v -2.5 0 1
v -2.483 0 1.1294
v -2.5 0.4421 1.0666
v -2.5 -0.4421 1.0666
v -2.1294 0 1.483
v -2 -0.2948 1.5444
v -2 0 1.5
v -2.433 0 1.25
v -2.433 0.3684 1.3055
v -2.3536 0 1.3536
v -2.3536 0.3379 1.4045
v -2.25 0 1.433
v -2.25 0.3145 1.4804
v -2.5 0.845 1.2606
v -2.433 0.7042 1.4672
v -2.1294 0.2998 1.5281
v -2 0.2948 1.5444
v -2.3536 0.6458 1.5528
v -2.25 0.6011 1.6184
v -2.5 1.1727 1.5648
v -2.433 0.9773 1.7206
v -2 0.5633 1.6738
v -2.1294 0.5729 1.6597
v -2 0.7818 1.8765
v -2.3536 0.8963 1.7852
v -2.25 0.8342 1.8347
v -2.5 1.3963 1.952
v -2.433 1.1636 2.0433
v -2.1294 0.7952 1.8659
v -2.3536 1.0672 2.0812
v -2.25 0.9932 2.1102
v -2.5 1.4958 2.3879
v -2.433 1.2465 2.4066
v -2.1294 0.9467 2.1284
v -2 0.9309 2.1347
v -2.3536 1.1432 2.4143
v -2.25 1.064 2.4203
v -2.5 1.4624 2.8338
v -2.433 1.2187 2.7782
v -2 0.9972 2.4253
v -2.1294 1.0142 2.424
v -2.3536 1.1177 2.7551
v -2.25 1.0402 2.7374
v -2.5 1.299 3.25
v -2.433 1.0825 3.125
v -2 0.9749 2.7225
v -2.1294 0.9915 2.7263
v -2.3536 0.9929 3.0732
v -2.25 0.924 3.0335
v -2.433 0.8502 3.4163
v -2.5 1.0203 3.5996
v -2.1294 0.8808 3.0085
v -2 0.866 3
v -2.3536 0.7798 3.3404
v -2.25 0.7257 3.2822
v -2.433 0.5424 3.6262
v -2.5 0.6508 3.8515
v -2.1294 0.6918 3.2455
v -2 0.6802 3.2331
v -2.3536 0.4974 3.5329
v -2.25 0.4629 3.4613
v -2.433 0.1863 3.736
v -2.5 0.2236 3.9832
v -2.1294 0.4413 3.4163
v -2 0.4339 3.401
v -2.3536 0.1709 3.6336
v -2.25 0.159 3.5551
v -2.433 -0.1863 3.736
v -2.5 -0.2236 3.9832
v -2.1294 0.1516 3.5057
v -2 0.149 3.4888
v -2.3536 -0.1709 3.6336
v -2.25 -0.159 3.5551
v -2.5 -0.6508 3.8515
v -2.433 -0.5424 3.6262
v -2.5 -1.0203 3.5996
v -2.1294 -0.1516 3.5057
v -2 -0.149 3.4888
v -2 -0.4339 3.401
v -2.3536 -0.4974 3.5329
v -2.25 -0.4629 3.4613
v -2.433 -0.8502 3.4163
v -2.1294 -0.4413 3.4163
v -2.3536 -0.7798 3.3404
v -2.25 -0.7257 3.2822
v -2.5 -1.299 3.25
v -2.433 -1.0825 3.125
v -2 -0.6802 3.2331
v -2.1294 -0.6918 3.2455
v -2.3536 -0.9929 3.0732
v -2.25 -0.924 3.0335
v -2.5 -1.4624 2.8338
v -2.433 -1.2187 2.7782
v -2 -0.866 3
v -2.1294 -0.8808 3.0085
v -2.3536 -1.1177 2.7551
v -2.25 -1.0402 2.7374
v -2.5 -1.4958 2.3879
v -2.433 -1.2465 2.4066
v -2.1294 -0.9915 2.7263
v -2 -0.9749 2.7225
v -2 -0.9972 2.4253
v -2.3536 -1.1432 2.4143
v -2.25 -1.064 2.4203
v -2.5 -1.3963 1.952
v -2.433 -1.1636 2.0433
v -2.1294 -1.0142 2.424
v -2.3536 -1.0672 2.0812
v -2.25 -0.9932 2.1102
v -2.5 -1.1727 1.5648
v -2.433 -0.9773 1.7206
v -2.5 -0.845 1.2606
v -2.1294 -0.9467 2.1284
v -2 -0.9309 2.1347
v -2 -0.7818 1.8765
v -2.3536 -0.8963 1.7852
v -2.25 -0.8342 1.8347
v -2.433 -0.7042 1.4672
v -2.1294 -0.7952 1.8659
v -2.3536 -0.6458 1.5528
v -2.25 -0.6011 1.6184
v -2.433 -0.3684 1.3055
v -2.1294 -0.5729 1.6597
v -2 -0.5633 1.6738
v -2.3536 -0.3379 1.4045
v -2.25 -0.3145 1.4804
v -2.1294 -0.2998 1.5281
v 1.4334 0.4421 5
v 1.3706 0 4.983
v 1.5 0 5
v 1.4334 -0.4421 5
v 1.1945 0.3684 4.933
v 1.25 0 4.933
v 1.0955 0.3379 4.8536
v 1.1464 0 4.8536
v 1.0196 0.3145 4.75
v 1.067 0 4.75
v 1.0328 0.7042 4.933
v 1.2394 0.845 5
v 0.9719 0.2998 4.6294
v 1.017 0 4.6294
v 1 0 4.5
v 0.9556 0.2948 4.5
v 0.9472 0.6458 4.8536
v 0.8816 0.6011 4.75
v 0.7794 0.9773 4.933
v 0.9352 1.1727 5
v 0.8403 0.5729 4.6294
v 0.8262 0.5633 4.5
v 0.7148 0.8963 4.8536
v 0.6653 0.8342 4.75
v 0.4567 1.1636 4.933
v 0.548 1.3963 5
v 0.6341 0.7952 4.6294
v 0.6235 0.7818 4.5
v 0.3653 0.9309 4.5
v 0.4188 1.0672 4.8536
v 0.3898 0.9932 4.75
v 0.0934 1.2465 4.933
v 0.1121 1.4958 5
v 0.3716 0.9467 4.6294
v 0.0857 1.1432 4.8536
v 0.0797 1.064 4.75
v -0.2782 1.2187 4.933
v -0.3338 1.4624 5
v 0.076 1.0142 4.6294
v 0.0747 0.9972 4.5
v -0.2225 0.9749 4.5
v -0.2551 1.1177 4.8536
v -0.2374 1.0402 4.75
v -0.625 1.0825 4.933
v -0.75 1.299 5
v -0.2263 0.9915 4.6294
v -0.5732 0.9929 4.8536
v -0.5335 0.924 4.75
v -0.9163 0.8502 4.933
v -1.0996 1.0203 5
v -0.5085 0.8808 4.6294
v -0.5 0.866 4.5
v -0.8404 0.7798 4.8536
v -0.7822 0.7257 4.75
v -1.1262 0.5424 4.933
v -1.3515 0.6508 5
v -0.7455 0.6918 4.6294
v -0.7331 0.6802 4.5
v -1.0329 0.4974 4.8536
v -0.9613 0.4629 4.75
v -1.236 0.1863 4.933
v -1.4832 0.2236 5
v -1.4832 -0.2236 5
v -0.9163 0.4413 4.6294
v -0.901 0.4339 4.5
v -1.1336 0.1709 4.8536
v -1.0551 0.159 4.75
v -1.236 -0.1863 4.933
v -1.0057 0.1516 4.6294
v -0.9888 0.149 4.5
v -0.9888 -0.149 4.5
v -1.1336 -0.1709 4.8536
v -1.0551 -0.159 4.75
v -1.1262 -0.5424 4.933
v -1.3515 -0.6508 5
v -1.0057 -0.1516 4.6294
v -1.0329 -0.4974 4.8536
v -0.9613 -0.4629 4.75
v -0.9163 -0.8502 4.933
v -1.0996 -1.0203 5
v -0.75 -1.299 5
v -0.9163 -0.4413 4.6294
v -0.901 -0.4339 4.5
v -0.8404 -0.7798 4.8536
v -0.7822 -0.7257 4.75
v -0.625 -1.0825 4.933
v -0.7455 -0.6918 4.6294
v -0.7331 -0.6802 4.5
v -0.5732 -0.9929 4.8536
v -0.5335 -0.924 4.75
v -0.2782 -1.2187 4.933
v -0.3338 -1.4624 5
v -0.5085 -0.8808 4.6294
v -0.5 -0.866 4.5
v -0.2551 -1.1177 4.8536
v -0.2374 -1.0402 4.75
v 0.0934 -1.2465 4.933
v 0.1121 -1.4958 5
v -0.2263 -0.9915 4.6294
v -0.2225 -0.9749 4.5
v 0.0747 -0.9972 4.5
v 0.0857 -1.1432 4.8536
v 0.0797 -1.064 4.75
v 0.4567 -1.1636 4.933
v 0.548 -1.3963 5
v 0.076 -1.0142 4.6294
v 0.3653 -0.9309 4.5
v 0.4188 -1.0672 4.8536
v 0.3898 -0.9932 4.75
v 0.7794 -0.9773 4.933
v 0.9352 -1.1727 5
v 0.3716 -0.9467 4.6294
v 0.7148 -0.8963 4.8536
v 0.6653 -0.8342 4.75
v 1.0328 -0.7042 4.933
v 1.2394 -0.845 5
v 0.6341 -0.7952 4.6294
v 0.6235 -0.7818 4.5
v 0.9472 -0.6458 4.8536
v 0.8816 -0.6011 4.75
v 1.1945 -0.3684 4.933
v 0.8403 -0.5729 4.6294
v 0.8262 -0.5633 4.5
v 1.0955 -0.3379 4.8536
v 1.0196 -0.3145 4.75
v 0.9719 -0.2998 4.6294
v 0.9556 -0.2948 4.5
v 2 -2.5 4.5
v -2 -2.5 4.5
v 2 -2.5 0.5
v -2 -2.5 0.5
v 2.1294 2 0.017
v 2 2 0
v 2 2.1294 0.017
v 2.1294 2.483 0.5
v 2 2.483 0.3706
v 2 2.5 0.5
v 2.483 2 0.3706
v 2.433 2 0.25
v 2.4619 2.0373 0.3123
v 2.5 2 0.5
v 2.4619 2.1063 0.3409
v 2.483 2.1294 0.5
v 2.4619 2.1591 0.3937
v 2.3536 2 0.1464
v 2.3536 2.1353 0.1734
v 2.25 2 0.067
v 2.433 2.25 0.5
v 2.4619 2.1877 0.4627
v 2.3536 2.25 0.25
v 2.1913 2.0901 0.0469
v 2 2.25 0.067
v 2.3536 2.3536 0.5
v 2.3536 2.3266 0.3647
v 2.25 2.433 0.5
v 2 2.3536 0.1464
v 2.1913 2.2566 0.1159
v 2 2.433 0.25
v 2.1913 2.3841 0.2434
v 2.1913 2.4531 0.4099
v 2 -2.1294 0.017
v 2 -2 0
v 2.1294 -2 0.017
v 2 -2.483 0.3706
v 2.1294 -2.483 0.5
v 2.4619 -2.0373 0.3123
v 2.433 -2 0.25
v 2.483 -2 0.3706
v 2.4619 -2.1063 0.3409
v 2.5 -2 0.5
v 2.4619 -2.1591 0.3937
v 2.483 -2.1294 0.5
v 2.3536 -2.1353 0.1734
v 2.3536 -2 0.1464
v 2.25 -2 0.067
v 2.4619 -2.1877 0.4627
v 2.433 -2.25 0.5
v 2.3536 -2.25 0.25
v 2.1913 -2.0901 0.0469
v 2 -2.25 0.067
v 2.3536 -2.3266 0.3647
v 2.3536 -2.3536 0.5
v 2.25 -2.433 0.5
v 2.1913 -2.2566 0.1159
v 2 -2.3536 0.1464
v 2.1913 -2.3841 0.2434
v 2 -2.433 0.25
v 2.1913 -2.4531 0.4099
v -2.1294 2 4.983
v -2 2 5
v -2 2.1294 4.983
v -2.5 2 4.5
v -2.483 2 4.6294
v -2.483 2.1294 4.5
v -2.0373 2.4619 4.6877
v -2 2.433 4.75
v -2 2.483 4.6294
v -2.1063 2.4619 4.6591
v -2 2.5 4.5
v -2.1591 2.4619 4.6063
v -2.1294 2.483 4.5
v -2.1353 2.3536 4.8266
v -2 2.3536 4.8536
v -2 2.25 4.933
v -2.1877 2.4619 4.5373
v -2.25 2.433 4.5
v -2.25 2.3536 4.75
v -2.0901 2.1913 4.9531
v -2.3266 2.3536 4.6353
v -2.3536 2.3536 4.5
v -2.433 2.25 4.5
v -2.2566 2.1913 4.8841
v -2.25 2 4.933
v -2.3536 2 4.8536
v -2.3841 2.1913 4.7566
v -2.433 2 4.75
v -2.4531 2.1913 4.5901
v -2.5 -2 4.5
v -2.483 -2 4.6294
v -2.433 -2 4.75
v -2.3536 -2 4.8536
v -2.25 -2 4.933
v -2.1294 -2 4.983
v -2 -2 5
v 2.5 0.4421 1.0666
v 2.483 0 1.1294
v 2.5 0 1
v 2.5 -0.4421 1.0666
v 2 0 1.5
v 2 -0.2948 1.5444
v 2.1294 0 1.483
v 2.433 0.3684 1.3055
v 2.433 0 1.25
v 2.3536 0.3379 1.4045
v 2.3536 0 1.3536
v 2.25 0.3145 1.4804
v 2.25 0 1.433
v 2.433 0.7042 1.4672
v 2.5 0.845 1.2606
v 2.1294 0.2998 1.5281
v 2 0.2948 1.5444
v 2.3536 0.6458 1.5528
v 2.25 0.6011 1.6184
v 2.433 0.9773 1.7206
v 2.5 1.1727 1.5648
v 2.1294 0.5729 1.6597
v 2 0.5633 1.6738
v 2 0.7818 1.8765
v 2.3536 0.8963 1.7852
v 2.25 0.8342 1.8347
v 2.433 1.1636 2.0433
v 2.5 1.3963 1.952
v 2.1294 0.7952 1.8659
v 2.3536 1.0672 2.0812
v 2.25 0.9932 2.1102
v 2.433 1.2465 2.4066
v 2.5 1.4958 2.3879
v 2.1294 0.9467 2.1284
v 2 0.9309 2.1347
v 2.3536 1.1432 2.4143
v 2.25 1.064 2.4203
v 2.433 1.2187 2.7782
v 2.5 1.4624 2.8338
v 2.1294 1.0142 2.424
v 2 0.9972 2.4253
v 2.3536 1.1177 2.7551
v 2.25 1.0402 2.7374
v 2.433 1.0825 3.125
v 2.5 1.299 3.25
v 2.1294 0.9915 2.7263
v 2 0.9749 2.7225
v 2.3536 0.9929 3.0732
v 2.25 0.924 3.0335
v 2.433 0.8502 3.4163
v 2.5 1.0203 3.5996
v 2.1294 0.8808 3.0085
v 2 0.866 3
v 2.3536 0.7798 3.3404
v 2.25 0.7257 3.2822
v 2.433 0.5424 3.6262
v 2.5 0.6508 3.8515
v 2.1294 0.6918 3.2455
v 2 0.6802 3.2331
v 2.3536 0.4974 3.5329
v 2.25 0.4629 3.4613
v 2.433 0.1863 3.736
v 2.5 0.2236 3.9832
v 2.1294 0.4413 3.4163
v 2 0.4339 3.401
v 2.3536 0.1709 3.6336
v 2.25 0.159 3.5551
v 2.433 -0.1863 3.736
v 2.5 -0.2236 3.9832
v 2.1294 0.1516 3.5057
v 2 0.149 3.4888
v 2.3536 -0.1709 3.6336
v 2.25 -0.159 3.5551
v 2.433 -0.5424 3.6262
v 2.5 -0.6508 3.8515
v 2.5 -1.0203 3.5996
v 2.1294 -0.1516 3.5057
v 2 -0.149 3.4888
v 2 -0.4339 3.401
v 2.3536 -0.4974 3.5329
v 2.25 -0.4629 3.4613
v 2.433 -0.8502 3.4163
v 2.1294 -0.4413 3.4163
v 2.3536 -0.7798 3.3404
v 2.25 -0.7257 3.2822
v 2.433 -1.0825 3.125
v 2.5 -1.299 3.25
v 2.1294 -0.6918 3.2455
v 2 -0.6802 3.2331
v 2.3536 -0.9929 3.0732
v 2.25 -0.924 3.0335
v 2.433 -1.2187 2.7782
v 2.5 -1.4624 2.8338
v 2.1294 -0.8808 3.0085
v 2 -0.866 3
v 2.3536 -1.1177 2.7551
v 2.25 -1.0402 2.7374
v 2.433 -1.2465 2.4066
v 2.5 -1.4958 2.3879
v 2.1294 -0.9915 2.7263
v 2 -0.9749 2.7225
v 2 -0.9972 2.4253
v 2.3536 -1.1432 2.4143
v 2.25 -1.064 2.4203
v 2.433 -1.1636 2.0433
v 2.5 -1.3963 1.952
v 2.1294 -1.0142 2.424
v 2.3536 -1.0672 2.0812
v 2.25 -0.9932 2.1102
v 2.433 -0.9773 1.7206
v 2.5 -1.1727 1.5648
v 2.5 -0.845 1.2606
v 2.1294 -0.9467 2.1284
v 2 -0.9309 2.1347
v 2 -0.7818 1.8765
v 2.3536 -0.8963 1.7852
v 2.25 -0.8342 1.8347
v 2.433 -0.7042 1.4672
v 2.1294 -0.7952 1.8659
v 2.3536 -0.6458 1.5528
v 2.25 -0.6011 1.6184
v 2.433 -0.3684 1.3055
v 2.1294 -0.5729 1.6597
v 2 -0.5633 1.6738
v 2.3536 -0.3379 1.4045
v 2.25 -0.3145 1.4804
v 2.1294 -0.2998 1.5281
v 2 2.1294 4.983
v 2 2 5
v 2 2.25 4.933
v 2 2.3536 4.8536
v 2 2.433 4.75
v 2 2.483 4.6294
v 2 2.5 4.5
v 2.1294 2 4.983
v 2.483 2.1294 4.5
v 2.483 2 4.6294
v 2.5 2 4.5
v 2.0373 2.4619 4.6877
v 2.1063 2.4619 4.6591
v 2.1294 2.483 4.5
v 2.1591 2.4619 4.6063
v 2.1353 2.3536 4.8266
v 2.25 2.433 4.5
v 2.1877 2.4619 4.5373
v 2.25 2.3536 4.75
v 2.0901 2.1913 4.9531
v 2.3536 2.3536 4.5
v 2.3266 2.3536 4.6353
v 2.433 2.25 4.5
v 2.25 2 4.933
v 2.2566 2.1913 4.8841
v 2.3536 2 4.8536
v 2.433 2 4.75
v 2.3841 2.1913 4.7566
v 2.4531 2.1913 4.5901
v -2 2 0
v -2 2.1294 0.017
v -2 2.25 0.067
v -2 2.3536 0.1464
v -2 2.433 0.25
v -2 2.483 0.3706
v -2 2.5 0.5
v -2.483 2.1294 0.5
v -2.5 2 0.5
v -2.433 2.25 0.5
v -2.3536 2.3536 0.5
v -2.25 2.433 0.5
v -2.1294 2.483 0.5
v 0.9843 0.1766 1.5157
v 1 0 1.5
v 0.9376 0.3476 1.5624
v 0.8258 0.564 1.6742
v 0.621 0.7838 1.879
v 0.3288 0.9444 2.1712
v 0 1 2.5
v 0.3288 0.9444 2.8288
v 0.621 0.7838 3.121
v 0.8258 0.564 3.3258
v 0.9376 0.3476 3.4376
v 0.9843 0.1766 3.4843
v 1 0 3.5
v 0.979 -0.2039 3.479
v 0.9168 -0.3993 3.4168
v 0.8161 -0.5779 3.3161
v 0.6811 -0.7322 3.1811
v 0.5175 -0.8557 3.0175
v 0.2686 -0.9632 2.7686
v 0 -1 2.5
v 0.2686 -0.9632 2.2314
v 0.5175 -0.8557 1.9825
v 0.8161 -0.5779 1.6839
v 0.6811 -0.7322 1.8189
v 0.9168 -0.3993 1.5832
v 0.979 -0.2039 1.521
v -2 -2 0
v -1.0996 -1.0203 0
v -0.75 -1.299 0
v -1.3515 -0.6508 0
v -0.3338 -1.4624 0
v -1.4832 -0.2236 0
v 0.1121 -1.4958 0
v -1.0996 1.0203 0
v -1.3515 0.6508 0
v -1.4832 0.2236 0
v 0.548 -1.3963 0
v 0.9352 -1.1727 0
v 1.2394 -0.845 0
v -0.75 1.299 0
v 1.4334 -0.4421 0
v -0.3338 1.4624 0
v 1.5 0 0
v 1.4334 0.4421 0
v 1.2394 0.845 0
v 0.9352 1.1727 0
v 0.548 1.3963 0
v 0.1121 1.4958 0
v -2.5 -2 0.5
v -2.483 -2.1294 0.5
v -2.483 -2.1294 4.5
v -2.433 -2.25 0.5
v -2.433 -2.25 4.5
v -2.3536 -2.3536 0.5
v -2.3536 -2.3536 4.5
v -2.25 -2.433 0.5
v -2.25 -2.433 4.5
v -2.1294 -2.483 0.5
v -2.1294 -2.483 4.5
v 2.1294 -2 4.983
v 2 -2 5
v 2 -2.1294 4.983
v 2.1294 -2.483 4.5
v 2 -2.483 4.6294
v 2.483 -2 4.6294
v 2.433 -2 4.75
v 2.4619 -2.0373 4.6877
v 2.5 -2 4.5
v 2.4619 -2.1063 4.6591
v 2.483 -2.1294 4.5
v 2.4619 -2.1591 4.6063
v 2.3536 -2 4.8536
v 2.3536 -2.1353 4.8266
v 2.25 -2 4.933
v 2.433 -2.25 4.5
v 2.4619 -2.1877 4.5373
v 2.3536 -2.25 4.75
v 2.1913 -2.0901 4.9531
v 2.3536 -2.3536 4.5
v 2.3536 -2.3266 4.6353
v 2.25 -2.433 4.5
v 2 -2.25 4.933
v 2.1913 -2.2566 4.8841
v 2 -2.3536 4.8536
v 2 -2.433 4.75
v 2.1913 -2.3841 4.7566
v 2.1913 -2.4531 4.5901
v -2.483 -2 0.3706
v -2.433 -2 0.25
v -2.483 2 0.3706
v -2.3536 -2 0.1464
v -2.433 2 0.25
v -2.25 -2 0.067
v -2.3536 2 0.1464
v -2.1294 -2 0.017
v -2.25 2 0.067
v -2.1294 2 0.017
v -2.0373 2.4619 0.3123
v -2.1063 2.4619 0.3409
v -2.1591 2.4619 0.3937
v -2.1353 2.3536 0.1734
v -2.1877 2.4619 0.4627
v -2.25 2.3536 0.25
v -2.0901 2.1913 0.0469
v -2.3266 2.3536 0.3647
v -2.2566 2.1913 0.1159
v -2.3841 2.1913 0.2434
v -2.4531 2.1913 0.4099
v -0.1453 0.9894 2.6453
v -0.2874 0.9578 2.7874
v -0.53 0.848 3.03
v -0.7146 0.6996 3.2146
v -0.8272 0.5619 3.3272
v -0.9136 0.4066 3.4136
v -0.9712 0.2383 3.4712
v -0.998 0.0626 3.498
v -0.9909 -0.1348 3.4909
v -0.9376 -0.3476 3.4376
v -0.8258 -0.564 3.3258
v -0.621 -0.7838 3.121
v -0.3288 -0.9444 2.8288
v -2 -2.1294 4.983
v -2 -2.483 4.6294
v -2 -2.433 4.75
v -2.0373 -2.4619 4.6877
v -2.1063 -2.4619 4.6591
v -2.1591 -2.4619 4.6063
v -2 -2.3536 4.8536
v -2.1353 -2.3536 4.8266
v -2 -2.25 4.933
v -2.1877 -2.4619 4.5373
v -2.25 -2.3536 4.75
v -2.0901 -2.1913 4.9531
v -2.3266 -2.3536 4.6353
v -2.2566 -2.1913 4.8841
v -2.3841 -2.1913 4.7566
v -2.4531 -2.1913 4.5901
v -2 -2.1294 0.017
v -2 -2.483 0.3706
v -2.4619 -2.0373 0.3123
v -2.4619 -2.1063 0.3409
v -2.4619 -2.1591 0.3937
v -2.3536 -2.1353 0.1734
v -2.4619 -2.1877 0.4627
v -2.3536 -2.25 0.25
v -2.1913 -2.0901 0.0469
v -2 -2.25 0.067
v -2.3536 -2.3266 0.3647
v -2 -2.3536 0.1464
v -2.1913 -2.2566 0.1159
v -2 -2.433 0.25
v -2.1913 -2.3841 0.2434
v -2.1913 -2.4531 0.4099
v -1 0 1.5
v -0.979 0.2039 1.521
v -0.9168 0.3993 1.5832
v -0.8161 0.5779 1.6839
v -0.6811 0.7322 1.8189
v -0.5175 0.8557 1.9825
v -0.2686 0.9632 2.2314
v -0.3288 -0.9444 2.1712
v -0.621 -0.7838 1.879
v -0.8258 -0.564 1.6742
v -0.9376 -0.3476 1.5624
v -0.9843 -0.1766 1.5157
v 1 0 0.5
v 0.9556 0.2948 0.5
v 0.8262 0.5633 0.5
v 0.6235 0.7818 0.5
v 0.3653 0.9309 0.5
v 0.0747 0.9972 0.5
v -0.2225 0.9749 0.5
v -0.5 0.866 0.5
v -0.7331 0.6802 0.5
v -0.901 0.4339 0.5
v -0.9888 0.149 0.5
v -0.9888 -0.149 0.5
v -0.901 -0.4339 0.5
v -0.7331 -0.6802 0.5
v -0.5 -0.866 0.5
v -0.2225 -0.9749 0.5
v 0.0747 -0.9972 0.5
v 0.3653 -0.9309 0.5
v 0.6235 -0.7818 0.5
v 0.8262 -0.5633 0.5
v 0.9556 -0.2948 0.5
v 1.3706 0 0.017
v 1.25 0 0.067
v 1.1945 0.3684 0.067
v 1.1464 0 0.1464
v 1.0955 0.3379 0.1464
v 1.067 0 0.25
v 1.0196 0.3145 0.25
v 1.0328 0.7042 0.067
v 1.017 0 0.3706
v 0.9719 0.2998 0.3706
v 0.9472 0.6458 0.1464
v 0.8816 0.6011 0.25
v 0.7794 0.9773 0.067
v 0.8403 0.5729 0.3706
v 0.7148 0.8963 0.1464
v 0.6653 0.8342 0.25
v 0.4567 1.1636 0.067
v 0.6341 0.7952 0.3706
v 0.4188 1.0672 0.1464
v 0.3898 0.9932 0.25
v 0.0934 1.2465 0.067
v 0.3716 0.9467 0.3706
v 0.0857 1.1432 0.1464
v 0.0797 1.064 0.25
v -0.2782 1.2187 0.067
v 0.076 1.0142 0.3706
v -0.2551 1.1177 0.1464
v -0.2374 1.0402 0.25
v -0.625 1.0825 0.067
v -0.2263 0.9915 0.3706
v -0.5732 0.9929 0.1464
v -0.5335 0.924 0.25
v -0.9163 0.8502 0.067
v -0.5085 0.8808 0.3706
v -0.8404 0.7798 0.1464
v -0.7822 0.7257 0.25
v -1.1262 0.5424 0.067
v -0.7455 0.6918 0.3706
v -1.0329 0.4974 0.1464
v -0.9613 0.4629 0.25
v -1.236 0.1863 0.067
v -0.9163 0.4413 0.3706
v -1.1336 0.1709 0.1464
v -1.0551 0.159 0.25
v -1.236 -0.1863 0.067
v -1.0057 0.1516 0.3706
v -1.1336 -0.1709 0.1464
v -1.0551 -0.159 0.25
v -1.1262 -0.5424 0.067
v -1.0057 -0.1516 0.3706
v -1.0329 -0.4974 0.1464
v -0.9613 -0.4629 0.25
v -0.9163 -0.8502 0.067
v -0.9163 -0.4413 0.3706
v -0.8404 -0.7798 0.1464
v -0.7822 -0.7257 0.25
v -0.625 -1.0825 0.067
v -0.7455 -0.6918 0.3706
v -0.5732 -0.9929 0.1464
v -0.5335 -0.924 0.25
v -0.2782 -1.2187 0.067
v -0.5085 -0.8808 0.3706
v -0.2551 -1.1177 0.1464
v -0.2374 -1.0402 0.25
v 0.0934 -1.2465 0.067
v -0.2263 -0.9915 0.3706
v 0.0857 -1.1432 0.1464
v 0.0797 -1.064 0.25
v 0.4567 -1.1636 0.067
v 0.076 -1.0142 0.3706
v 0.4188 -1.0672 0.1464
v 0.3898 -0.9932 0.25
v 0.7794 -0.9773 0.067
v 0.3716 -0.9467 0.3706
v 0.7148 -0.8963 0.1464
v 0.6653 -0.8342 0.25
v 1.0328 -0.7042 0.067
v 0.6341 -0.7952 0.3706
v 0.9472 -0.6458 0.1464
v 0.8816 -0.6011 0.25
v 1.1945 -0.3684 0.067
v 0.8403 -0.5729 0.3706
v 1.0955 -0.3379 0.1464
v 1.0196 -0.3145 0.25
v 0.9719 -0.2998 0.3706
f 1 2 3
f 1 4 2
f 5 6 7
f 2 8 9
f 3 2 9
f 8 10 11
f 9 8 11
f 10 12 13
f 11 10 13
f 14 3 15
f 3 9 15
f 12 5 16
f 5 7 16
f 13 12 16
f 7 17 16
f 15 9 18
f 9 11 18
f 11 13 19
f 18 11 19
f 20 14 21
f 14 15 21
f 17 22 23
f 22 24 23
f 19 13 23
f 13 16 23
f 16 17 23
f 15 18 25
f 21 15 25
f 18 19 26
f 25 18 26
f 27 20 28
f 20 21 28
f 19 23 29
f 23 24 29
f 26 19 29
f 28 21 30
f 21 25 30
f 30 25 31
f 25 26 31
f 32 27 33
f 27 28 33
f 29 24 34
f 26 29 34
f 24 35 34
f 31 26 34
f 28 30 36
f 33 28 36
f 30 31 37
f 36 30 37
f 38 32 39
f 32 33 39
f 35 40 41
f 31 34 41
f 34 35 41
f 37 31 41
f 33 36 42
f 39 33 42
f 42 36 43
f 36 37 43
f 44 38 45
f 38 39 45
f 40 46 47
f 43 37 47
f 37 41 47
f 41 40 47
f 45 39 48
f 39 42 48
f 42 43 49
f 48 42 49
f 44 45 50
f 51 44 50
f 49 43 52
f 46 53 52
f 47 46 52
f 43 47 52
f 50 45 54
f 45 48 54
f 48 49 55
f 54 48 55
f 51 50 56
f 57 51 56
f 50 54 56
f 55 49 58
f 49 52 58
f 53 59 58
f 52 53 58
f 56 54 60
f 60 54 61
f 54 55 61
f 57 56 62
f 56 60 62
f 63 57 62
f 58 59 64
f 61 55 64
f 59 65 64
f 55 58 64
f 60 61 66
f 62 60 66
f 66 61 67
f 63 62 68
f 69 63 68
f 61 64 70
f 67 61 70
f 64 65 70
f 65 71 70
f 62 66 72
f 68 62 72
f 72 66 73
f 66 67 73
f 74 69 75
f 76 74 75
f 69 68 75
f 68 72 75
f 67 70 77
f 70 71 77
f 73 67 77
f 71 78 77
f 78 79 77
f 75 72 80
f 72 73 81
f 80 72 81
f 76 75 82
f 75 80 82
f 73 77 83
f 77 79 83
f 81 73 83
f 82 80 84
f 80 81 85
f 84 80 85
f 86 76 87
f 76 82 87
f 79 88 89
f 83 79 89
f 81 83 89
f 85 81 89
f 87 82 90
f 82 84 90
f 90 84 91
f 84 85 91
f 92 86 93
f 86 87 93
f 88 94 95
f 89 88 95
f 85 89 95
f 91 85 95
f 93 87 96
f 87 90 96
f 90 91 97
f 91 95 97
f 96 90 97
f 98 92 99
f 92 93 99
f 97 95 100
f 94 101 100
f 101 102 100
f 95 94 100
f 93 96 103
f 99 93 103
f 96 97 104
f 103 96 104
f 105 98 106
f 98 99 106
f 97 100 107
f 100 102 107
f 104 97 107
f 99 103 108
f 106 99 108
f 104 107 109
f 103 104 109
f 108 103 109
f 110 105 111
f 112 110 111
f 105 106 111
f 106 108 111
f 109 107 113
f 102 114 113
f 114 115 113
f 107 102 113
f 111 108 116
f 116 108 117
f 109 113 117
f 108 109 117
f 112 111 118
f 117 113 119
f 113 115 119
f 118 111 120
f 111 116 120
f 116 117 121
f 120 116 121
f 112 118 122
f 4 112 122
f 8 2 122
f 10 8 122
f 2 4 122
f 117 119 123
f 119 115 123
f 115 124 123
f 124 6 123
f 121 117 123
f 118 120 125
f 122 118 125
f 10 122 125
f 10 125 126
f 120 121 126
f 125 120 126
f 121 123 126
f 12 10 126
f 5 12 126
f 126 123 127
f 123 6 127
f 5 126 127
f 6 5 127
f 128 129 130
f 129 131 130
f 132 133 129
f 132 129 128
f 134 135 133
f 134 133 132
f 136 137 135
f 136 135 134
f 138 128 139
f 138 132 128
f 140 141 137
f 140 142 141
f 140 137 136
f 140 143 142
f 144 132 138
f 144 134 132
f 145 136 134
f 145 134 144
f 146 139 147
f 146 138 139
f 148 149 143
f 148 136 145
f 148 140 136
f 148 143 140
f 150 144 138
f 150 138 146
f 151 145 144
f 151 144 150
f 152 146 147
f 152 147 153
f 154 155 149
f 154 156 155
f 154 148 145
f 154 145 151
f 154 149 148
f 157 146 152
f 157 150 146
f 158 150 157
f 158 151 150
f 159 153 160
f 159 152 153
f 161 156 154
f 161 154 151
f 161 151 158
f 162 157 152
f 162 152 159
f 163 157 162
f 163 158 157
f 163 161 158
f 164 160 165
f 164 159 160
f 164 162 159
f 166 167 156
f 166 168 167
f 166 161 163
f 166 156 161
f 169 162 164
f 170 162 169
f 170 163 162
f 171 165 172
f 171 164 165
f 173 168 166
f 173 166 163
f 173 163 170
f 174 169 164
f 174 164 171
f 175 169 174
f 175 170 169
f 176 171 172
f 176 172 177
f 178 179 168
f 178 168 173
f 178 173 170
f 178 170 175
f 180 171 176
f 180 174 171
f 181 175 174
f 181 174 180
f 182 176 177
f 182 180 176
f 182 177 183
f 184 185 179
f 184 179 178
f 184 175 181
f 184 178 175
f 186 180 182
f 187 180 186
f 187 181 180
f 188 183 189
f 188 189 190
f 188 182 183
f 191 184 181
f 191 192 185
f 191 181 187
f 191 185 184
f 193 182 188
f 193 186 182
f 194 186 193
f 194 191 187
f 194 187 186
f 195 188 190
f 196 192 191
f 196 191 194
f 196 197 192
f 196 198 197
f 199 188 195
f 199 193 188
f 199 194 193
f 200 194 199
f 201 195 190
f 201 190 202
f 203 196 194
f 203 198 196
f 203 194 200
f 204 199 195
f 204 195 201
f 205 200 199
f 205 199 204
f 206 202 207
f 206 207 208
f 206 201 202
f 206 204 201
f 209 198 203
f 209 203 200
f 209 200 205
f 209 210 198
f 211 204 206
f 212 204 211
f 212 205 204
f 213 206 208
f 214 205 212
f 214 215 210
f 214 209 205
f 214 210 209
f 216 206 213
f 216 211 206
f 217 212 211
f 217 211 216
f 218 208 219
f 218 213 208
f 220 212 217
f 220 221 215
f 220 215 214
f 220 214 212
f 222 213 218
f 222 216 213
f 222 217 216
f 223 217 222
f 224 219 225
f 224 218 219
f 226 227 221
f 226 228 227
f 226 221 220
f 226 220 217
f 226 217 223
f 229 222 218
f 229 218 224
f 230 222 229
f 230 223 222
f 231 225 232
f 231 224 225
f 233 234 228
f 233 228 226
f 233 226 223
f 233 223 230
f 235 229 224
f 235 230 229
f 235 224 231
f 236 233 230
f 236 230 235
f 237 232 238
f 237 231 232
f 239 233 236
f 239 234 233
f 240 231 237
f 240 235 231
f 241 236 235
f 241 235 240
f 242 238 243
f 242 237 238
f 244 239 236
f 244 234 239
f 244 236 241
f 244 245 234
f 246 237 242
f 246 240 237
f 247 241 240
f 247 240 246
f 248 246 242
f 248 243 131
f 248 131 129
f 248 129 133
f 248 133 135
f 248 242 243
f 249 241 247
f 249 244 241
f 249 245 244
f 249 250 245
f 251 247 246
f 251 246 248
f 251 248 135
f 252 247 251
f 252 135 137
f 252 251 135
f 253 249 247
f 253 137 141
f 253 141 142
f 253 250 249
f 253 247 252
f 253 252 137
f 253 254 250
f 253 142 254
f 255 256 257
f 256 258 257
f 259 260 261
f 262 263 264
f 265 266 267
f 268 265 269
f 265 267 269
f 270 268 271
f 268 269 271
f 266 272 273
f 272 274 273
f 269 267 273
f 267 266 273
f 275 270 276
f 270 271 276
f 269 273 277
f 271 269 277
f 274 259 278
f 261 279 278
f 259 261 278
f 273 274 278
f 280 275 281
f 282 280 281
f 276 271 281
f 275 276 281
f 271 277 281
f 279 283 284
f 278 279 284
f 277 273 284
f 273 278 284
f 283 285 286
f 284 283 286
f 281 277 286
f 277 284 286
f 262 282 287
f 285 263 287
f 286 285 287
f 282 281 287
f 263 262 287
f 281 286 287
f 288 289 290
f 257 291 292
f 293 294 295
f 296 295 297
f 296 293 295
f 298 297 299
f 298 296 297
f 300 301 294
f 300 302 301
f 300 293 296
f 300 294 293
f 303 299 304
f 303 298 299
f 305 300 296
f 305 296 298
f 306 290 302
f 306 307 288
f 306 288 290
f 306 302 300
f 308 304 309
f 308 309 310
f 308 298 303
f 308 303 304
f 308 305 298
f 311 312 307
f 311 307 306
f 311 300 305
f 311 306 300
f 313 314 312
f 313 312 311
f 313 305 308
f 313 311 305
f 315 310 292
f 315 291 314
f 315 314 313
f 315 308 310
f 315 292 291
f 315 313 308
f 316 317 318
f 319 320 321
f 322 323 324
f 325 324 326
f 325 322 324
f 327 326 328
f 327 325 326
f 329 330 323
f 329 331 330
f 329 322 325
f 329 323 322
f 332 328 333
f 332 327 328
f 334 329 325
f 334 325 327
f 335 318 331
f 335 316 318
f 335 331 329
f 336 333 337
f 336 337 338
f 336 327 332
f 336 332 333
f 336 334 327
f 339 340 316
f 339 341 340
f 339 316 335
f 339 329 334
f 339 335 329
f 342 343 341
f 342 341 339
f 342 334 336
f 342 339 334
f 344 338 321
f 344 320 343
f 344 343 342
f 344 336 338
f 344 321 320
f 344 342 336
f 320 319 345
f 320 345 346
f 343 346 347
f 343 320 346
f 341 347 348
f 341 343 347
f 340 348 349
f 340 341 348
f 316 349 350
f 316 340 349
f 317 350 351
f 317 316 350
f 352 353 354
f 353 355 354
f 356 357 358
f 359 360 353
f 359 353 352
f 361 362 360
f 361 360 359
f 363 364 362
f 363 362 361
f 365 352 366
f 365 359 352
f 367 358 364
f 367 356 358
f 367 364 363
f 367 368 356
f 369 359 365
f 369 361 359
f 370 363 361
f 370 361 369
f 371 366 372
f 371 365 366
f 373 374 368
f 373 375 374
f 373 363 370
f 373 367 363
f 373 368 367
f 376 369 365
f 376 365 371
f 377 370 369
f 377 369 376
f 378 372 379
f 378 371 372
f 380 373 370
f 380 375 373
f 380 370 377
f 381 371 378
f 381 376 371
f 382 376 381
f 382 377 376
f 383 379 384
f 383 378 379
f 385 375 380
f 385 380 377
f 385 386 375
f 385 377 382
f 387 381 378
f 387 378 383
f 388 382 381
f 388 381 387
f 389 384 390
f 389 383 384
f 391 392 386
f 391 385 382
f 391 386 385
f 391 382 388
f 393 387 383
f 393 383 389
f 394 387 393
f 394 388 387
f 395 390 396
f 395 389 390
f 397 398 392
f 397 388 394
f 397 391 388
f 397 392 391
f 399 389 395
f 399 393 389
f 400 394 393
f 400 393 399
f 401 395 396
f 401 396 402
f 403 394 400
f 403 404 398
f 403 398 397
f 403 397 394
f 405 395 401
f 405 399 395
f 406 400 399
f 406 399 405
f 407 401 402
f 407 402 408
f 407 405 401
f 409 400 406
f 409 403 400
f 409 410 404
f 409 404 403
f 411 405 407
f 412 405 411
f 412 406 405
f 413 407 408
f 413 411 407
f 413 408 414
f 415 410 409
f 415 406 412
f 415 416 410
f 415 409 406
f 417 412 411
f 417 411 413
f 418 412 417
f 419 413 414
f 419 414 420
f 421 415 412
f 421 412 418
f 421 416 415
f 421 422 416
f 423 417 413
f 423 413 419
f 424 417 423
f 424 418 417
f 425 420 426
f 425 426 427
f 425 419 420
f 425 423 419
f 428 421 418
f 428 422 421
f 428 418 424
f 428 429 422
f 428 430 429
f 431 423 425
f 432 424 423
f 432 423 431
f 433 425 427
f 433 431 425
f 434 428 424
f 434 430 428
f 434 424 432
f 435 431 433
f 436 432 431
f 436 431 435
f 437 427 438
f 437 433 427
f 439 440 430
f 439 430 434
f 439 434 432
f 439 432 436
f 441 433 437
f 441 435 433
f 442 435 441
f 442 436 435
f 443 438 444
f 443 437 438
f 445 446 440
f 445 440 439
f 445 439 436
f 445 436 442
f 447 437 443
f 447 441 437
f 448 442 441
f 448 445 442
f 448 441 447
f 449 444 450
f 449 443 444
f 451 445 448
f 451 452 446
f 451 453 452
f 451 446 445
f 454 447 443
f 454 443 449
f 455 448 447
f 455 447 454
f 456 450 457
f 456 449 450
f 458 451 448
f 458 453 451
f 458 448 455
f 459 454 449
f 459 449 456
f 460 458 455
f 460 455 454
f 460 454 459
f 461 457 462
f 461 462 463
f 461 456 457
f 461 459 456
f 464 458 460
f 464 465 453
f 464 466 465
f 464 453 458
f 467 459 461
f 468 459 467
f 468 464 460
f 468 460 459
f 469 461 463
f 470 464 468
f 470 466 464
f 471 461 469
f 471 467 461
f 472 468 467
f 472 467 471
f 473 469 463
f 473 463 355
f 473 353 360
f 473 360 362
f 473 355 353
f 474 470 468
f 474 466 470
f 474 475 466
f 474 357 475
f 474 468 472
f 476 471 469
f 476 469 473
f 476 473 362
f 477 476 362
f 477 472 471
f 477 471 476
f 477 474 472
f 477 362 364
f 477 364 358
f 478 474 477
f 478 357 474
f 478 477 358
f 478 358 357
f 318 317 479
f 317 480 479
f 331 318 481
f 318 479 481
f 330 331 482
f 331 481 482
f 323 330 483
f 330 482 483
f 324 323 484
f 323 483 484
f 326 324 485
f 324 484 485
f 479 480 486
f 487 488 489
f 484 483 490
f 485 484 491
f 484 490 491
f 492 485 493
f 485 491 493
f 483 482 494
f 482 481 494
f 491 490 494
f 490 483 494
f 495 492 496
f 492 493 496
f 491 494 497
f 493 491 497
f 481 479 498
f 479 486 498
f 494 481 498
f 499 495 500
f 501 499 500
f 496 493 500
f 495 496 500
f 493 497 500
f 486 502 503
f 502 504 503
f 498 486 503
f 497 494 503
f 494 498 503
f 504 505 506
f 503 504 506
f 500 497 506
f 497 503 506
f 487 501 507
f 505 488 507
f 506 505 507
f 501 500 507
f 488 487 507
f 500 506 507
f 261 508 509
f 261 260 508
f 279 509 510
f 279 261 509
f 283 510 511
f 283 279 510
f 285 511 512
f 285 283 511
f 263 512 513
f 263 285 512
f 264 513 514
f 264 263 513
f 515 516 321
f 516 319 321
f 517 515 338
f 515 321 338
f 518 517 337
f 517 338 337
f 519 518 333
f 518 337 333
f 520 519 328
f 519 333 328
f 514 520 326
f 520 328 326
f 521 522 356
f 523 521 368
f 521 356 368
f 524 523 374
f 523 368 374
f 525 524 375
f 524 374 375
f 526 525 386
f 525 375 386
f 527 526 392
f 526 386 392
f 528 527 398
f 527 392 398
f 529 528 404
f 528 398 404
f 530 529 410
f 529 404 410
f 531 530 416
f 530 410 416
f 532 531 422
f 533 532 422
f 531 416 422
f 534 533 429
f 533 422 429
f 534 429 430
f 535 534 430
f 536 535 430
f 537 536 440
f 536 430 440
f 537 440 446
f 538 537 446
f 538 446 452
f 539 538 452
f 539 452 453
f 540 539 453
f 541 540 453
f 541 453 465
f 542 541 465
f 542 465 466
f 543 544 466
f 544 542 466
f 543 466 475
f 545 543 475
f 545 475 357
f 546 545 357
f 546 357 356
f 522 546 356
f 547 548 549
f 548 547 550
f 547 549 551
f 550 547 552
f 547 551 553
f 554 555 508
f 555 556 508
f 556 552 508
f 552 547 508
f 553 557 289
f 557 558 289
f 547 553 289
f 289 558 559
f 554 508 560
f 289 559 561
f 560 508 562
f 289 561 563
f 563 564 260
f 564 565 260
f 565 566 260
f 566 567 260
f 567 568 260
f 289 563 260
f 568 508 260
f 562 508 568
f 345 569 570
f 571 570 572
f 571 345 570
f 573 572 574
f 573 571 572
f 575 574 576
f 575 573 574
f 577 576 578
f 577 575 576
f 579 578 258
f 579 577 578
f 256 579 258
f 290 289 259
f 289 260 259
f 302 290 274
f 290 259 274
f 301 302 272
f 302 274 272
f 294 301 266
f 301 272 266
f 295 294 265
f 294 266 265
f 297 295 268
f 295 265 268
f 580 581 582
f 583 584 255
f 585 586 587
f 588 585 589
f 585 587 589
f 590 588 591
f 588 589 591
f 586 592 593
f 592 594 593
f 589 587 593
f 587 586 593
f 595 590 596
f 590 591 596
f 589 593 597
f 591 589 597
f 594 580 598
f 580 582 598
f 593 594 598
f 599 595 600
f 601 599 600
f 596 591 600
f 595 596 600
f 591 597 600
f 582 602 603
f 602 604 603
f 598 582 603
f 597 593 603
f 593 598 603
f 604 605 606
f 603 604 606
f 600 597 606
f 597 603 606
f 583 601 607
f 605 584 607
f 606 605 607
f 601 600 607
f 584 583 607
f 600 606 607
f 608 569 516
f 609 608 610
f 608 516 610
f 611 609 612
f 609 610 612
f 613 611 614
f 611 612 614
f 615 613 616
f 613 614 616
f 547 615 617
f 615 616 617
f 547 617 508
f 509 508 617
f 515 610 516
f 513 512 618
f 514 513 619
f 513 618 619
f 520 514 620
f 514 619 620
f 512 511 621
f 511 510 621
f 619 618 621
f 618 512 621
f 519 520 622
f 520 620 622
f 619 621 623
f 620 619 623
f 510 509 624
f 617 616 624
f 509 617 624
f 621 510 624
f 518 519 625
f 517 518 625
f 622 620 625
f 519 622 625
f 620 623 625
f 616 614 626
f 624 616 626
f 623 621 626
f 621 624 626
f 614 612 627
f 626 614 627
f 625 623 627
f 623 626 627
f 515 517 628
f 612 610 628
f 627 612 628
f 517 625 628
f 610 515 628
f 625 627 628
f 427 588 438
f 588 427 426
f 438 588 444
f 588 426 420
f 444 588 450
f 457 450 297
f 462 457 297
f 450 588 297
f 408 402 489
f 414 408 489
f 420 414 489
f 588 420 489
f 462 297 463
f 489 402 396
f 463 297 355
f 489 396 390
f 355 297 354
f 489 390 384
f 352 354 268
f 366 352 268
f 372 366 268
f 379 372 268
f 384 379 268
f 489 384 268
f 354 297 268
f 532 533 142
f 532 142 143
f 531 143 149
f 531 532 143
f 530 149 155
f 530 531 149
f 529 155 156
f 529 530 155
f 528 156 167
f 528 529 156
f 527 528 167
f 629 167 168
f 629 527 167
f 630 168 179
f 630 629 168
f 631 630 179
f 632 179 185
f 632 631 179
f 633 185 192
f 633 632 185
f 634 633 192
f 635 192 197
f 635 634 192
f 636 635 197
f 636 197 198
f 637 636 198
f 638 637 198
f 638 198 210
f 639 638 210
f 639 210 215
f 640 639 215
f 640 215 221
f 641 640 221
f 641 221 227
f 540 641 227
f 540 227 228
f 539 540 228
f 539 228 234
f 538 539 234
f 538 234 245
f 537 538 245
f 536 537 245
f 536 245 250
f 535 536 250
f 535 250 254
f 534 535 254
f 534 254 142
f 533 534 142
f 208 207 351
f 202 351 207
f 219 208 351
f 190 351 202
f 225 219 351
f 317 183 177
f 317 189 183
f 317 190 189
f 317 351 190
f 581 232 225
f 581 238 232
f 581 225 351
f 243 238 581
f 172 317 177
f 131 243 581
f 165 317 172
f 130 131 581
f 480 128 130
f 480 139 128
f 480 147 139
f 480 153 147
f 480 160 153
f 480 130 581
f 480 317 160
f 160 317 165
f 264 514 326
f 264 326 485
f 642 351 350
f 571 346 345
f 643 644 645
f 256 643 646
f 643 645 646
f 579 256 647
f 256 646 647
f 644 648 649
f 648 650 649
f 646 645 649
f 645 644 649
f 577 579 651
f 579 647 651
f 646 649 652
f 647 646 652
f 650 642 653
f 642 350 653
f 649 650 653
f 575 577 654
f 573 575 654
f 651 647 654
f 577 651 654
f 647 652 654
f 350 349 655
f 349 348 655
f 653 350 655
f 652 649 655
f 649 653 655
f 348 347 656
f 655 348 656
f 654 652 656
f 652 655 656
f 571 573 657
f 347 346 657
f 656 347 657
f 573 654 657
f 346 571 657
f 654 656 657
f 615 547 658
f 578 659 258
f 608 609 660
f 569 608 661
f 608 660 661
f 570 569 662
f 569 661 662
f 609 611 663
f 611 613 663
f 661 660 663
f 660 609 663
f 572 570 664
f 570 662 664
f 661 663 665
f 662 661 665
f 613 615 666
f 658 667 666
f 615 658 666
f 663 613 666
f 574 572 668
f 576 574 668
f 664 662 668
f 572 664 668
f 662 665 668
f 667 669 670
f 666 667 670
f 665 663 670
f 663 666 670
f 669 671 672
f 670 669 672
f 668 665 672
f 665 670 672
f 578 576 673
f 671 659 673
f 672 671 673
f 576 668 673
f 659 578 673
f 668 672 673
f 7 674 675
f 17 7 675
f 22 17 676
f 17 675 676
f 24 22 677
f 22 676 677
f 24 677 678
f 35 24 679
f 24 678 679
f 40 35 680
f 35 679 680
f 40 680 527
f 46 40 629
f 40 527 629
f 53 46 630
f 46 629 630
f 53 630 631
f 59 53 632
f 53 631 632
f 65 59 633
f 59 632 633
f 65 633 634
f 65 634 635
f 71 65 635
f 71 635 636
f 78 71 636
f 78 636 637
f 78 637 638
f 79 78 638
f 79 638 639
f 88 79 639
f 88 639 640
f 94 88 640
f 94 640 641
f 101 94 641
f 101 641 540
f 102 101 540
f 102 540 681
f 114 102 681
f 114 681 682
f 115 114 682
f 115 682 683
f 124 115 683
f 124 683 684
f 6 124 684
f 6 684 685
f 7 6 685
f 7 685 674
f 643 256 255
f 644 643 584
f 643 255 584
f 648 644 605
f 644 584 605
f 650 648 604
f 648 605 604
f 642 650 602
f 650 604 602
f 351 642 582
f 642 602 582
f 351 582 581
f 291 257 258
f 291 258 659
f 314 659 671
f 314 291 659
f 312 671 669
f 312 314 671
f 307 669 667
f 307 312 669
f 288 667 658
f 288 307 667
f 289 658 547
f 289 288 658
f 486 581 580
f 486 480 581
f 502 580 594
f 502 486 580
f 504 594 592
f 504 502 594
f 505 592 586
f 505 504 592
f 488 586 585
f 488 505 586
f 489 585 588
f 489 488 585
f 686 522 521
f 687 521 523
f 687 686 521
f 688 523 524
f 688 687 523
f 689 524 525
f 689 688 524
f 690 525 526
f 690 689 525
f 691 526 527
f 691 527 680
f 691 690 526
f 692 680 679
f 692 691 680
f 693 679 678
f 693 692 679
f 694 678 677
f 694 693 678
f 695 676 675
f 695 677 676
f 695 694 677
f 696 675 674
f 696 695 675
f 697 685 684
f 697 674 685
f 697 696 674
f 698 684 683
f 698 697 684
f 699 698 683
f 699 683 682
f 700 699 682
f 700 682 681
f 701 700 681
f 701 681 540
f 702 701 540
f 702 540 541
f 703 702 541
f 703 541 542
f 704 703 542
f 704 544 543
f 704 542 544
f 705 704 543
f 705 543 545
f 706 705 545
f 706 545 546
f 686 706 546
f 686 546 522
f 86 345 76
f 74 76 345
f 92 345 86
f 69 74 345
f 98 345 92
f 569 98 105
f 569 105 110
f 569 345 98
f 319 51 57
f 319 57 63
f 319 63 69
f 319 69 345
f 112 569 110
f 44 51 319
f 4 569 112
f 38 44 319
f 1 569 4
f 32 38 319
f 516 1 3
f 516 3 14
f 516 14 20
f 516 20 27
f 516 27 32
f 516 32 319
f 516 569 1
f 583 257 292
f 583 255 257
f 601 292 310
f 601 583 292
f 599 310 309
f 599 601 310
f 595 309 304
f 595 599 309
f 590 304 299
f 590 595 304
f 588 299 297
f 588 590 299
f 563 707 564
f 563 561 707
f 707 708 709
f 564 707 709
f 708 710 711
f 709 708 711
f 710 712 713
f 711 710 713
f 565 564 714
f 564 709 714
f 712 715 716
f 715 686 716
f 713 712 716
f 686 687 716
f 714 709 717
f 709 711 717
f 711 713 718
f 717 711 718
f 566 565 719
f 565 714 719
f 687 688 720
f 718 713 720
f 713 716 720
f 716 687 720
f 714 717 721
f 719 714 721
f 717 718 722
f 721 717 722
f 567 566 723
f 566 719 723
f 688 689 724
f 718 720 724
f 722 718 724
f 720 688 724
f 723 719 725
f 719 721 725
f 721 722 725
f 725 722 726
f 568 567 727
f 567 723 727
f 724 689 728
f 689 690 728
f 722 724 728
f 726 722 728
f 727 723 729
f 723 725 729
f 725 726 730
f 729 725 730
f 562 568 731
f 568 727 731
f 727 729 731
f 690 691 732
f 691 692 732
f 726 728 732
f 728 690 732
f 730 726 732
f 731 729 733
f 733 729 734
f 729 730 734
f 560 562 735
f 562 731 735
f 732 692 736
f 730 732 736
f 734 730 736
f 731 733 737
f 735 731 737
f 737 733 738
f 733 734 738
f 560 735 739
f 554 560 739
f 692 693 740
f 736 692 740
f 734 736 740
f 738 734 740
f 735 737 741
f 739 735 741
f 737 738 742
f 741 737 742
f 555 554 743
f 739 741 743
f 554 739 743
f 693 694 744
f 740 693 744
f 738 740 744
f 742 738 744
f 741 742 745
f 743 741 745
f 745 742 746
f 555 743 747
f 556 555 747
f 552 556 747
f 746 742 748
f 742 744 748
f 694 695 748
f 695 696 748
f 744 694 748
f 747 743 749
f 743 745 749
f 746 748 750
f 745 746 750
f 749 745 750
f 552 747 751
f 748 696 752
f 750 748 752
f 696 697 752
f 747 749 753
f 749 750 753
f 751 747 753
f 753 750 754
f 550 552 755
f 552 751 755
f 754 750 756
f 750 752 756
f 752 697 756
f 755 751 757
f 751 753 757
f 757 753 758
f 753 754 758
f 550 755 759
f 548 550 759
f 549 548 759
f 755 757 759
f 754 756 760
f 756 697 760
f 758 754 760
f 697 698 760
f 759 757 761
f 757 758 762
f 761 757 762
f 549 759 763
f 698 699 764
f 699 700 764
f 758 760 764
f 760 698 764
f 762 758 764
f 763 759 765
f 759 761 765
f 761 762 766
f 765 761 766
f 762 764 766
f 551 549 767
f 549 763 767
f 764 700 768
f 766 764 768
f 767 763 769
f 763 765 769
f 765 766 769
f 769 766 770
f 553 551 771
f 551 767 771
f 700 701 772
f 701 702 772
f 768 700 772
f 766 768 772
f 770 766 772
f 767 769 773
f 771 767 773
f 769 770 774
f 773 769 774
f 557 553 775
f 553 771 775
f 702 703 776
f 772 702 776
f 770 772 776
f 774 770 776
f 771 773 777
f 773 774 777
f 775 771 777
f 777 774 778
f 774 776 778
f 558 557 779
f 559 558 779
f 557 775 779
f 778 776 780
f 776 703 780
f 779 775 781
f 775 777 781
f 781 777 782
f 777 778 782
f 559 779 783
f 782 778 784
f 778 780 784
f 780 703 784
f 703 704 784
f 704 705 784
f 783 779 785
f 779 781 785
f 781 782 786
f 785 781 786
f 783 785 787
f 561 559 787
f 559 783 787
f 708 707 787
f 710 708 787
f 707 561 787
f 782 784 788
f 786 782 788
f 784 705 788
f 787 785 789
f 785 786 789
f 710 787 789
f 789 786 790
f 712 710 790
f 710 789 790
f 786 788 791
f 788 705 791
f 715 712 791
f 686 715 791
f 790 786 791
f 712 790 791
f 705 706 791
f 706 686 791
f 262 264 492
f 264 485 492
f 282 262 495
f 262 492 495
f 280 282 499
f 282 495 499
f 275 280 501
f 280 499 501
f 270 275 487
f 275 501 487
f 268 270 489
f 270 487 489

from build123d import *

# Parameters (mm, degrees)
ESQUISSE1_W             = 5
ESQUISSE1_H             = 5
ESQUISSE1_R             = 1
BOSS_EXTRU_1_DEPTH      = 5
ESQUISSE2_R             = 1
ENL_V_MAT_EXTRU_1_DEPTH = 10
CONG_1_R                = 0.5


with BuildPart() as part:
    # Esquisse1 → Boss.-Extru.1 (new body)
    with BuildSketch(Plane.XY):
        Rectangle(ESQUISSE1_W, ESQUISSE1_H)
        Circle(ESQUISSE1_R, mode=Mode.SUBTRACT)
    extrude(amount=BOSS_EXTRU_1_DEPTH)

    # Esquisse2 → Enlèv. mat.-Extru.1 (cut)
    with BuildSketch(Plane(origin=(2.5, 0, 0), x_dir=(0, 0, -1), z_dir=(1, 0, 0))):
        with Locations((-2.5, 0)):
            Circle(ESQUISSE2_R)
    extrude(amount=-ENL_V_MAT_EXTRU_1_DEPTH, mode=Mode.SUBTRACT)

    # Congé1
    cong_1_edges = [part.edges().sort_by_distance(p)[0] for p in [
        (-2.5, 0, 5),
        (-1, 0, 0),
        (-1, 0, 5),
        (0, -2.5, 5),
        (-2.5, 0, 3.5),
        (2.5, 0, 3.5),
        (2.5, 0, 5),
        (0, -2.5, 0),
        (-2.5, 0, 0),
        (0, 2.5, 0),
        (2.5, 0, 0),
        (0, 2.5, 5),
        (2.5, -2.5, 2.5),
        (-2.5, -2.5, 2.5),
        (-2.5, 2.5, 2.5),
        (2.5, 2.5, 2.5),
    ]]
    fillet(cong_1_edges, radius=CONG_1_R)


solid = part.part
